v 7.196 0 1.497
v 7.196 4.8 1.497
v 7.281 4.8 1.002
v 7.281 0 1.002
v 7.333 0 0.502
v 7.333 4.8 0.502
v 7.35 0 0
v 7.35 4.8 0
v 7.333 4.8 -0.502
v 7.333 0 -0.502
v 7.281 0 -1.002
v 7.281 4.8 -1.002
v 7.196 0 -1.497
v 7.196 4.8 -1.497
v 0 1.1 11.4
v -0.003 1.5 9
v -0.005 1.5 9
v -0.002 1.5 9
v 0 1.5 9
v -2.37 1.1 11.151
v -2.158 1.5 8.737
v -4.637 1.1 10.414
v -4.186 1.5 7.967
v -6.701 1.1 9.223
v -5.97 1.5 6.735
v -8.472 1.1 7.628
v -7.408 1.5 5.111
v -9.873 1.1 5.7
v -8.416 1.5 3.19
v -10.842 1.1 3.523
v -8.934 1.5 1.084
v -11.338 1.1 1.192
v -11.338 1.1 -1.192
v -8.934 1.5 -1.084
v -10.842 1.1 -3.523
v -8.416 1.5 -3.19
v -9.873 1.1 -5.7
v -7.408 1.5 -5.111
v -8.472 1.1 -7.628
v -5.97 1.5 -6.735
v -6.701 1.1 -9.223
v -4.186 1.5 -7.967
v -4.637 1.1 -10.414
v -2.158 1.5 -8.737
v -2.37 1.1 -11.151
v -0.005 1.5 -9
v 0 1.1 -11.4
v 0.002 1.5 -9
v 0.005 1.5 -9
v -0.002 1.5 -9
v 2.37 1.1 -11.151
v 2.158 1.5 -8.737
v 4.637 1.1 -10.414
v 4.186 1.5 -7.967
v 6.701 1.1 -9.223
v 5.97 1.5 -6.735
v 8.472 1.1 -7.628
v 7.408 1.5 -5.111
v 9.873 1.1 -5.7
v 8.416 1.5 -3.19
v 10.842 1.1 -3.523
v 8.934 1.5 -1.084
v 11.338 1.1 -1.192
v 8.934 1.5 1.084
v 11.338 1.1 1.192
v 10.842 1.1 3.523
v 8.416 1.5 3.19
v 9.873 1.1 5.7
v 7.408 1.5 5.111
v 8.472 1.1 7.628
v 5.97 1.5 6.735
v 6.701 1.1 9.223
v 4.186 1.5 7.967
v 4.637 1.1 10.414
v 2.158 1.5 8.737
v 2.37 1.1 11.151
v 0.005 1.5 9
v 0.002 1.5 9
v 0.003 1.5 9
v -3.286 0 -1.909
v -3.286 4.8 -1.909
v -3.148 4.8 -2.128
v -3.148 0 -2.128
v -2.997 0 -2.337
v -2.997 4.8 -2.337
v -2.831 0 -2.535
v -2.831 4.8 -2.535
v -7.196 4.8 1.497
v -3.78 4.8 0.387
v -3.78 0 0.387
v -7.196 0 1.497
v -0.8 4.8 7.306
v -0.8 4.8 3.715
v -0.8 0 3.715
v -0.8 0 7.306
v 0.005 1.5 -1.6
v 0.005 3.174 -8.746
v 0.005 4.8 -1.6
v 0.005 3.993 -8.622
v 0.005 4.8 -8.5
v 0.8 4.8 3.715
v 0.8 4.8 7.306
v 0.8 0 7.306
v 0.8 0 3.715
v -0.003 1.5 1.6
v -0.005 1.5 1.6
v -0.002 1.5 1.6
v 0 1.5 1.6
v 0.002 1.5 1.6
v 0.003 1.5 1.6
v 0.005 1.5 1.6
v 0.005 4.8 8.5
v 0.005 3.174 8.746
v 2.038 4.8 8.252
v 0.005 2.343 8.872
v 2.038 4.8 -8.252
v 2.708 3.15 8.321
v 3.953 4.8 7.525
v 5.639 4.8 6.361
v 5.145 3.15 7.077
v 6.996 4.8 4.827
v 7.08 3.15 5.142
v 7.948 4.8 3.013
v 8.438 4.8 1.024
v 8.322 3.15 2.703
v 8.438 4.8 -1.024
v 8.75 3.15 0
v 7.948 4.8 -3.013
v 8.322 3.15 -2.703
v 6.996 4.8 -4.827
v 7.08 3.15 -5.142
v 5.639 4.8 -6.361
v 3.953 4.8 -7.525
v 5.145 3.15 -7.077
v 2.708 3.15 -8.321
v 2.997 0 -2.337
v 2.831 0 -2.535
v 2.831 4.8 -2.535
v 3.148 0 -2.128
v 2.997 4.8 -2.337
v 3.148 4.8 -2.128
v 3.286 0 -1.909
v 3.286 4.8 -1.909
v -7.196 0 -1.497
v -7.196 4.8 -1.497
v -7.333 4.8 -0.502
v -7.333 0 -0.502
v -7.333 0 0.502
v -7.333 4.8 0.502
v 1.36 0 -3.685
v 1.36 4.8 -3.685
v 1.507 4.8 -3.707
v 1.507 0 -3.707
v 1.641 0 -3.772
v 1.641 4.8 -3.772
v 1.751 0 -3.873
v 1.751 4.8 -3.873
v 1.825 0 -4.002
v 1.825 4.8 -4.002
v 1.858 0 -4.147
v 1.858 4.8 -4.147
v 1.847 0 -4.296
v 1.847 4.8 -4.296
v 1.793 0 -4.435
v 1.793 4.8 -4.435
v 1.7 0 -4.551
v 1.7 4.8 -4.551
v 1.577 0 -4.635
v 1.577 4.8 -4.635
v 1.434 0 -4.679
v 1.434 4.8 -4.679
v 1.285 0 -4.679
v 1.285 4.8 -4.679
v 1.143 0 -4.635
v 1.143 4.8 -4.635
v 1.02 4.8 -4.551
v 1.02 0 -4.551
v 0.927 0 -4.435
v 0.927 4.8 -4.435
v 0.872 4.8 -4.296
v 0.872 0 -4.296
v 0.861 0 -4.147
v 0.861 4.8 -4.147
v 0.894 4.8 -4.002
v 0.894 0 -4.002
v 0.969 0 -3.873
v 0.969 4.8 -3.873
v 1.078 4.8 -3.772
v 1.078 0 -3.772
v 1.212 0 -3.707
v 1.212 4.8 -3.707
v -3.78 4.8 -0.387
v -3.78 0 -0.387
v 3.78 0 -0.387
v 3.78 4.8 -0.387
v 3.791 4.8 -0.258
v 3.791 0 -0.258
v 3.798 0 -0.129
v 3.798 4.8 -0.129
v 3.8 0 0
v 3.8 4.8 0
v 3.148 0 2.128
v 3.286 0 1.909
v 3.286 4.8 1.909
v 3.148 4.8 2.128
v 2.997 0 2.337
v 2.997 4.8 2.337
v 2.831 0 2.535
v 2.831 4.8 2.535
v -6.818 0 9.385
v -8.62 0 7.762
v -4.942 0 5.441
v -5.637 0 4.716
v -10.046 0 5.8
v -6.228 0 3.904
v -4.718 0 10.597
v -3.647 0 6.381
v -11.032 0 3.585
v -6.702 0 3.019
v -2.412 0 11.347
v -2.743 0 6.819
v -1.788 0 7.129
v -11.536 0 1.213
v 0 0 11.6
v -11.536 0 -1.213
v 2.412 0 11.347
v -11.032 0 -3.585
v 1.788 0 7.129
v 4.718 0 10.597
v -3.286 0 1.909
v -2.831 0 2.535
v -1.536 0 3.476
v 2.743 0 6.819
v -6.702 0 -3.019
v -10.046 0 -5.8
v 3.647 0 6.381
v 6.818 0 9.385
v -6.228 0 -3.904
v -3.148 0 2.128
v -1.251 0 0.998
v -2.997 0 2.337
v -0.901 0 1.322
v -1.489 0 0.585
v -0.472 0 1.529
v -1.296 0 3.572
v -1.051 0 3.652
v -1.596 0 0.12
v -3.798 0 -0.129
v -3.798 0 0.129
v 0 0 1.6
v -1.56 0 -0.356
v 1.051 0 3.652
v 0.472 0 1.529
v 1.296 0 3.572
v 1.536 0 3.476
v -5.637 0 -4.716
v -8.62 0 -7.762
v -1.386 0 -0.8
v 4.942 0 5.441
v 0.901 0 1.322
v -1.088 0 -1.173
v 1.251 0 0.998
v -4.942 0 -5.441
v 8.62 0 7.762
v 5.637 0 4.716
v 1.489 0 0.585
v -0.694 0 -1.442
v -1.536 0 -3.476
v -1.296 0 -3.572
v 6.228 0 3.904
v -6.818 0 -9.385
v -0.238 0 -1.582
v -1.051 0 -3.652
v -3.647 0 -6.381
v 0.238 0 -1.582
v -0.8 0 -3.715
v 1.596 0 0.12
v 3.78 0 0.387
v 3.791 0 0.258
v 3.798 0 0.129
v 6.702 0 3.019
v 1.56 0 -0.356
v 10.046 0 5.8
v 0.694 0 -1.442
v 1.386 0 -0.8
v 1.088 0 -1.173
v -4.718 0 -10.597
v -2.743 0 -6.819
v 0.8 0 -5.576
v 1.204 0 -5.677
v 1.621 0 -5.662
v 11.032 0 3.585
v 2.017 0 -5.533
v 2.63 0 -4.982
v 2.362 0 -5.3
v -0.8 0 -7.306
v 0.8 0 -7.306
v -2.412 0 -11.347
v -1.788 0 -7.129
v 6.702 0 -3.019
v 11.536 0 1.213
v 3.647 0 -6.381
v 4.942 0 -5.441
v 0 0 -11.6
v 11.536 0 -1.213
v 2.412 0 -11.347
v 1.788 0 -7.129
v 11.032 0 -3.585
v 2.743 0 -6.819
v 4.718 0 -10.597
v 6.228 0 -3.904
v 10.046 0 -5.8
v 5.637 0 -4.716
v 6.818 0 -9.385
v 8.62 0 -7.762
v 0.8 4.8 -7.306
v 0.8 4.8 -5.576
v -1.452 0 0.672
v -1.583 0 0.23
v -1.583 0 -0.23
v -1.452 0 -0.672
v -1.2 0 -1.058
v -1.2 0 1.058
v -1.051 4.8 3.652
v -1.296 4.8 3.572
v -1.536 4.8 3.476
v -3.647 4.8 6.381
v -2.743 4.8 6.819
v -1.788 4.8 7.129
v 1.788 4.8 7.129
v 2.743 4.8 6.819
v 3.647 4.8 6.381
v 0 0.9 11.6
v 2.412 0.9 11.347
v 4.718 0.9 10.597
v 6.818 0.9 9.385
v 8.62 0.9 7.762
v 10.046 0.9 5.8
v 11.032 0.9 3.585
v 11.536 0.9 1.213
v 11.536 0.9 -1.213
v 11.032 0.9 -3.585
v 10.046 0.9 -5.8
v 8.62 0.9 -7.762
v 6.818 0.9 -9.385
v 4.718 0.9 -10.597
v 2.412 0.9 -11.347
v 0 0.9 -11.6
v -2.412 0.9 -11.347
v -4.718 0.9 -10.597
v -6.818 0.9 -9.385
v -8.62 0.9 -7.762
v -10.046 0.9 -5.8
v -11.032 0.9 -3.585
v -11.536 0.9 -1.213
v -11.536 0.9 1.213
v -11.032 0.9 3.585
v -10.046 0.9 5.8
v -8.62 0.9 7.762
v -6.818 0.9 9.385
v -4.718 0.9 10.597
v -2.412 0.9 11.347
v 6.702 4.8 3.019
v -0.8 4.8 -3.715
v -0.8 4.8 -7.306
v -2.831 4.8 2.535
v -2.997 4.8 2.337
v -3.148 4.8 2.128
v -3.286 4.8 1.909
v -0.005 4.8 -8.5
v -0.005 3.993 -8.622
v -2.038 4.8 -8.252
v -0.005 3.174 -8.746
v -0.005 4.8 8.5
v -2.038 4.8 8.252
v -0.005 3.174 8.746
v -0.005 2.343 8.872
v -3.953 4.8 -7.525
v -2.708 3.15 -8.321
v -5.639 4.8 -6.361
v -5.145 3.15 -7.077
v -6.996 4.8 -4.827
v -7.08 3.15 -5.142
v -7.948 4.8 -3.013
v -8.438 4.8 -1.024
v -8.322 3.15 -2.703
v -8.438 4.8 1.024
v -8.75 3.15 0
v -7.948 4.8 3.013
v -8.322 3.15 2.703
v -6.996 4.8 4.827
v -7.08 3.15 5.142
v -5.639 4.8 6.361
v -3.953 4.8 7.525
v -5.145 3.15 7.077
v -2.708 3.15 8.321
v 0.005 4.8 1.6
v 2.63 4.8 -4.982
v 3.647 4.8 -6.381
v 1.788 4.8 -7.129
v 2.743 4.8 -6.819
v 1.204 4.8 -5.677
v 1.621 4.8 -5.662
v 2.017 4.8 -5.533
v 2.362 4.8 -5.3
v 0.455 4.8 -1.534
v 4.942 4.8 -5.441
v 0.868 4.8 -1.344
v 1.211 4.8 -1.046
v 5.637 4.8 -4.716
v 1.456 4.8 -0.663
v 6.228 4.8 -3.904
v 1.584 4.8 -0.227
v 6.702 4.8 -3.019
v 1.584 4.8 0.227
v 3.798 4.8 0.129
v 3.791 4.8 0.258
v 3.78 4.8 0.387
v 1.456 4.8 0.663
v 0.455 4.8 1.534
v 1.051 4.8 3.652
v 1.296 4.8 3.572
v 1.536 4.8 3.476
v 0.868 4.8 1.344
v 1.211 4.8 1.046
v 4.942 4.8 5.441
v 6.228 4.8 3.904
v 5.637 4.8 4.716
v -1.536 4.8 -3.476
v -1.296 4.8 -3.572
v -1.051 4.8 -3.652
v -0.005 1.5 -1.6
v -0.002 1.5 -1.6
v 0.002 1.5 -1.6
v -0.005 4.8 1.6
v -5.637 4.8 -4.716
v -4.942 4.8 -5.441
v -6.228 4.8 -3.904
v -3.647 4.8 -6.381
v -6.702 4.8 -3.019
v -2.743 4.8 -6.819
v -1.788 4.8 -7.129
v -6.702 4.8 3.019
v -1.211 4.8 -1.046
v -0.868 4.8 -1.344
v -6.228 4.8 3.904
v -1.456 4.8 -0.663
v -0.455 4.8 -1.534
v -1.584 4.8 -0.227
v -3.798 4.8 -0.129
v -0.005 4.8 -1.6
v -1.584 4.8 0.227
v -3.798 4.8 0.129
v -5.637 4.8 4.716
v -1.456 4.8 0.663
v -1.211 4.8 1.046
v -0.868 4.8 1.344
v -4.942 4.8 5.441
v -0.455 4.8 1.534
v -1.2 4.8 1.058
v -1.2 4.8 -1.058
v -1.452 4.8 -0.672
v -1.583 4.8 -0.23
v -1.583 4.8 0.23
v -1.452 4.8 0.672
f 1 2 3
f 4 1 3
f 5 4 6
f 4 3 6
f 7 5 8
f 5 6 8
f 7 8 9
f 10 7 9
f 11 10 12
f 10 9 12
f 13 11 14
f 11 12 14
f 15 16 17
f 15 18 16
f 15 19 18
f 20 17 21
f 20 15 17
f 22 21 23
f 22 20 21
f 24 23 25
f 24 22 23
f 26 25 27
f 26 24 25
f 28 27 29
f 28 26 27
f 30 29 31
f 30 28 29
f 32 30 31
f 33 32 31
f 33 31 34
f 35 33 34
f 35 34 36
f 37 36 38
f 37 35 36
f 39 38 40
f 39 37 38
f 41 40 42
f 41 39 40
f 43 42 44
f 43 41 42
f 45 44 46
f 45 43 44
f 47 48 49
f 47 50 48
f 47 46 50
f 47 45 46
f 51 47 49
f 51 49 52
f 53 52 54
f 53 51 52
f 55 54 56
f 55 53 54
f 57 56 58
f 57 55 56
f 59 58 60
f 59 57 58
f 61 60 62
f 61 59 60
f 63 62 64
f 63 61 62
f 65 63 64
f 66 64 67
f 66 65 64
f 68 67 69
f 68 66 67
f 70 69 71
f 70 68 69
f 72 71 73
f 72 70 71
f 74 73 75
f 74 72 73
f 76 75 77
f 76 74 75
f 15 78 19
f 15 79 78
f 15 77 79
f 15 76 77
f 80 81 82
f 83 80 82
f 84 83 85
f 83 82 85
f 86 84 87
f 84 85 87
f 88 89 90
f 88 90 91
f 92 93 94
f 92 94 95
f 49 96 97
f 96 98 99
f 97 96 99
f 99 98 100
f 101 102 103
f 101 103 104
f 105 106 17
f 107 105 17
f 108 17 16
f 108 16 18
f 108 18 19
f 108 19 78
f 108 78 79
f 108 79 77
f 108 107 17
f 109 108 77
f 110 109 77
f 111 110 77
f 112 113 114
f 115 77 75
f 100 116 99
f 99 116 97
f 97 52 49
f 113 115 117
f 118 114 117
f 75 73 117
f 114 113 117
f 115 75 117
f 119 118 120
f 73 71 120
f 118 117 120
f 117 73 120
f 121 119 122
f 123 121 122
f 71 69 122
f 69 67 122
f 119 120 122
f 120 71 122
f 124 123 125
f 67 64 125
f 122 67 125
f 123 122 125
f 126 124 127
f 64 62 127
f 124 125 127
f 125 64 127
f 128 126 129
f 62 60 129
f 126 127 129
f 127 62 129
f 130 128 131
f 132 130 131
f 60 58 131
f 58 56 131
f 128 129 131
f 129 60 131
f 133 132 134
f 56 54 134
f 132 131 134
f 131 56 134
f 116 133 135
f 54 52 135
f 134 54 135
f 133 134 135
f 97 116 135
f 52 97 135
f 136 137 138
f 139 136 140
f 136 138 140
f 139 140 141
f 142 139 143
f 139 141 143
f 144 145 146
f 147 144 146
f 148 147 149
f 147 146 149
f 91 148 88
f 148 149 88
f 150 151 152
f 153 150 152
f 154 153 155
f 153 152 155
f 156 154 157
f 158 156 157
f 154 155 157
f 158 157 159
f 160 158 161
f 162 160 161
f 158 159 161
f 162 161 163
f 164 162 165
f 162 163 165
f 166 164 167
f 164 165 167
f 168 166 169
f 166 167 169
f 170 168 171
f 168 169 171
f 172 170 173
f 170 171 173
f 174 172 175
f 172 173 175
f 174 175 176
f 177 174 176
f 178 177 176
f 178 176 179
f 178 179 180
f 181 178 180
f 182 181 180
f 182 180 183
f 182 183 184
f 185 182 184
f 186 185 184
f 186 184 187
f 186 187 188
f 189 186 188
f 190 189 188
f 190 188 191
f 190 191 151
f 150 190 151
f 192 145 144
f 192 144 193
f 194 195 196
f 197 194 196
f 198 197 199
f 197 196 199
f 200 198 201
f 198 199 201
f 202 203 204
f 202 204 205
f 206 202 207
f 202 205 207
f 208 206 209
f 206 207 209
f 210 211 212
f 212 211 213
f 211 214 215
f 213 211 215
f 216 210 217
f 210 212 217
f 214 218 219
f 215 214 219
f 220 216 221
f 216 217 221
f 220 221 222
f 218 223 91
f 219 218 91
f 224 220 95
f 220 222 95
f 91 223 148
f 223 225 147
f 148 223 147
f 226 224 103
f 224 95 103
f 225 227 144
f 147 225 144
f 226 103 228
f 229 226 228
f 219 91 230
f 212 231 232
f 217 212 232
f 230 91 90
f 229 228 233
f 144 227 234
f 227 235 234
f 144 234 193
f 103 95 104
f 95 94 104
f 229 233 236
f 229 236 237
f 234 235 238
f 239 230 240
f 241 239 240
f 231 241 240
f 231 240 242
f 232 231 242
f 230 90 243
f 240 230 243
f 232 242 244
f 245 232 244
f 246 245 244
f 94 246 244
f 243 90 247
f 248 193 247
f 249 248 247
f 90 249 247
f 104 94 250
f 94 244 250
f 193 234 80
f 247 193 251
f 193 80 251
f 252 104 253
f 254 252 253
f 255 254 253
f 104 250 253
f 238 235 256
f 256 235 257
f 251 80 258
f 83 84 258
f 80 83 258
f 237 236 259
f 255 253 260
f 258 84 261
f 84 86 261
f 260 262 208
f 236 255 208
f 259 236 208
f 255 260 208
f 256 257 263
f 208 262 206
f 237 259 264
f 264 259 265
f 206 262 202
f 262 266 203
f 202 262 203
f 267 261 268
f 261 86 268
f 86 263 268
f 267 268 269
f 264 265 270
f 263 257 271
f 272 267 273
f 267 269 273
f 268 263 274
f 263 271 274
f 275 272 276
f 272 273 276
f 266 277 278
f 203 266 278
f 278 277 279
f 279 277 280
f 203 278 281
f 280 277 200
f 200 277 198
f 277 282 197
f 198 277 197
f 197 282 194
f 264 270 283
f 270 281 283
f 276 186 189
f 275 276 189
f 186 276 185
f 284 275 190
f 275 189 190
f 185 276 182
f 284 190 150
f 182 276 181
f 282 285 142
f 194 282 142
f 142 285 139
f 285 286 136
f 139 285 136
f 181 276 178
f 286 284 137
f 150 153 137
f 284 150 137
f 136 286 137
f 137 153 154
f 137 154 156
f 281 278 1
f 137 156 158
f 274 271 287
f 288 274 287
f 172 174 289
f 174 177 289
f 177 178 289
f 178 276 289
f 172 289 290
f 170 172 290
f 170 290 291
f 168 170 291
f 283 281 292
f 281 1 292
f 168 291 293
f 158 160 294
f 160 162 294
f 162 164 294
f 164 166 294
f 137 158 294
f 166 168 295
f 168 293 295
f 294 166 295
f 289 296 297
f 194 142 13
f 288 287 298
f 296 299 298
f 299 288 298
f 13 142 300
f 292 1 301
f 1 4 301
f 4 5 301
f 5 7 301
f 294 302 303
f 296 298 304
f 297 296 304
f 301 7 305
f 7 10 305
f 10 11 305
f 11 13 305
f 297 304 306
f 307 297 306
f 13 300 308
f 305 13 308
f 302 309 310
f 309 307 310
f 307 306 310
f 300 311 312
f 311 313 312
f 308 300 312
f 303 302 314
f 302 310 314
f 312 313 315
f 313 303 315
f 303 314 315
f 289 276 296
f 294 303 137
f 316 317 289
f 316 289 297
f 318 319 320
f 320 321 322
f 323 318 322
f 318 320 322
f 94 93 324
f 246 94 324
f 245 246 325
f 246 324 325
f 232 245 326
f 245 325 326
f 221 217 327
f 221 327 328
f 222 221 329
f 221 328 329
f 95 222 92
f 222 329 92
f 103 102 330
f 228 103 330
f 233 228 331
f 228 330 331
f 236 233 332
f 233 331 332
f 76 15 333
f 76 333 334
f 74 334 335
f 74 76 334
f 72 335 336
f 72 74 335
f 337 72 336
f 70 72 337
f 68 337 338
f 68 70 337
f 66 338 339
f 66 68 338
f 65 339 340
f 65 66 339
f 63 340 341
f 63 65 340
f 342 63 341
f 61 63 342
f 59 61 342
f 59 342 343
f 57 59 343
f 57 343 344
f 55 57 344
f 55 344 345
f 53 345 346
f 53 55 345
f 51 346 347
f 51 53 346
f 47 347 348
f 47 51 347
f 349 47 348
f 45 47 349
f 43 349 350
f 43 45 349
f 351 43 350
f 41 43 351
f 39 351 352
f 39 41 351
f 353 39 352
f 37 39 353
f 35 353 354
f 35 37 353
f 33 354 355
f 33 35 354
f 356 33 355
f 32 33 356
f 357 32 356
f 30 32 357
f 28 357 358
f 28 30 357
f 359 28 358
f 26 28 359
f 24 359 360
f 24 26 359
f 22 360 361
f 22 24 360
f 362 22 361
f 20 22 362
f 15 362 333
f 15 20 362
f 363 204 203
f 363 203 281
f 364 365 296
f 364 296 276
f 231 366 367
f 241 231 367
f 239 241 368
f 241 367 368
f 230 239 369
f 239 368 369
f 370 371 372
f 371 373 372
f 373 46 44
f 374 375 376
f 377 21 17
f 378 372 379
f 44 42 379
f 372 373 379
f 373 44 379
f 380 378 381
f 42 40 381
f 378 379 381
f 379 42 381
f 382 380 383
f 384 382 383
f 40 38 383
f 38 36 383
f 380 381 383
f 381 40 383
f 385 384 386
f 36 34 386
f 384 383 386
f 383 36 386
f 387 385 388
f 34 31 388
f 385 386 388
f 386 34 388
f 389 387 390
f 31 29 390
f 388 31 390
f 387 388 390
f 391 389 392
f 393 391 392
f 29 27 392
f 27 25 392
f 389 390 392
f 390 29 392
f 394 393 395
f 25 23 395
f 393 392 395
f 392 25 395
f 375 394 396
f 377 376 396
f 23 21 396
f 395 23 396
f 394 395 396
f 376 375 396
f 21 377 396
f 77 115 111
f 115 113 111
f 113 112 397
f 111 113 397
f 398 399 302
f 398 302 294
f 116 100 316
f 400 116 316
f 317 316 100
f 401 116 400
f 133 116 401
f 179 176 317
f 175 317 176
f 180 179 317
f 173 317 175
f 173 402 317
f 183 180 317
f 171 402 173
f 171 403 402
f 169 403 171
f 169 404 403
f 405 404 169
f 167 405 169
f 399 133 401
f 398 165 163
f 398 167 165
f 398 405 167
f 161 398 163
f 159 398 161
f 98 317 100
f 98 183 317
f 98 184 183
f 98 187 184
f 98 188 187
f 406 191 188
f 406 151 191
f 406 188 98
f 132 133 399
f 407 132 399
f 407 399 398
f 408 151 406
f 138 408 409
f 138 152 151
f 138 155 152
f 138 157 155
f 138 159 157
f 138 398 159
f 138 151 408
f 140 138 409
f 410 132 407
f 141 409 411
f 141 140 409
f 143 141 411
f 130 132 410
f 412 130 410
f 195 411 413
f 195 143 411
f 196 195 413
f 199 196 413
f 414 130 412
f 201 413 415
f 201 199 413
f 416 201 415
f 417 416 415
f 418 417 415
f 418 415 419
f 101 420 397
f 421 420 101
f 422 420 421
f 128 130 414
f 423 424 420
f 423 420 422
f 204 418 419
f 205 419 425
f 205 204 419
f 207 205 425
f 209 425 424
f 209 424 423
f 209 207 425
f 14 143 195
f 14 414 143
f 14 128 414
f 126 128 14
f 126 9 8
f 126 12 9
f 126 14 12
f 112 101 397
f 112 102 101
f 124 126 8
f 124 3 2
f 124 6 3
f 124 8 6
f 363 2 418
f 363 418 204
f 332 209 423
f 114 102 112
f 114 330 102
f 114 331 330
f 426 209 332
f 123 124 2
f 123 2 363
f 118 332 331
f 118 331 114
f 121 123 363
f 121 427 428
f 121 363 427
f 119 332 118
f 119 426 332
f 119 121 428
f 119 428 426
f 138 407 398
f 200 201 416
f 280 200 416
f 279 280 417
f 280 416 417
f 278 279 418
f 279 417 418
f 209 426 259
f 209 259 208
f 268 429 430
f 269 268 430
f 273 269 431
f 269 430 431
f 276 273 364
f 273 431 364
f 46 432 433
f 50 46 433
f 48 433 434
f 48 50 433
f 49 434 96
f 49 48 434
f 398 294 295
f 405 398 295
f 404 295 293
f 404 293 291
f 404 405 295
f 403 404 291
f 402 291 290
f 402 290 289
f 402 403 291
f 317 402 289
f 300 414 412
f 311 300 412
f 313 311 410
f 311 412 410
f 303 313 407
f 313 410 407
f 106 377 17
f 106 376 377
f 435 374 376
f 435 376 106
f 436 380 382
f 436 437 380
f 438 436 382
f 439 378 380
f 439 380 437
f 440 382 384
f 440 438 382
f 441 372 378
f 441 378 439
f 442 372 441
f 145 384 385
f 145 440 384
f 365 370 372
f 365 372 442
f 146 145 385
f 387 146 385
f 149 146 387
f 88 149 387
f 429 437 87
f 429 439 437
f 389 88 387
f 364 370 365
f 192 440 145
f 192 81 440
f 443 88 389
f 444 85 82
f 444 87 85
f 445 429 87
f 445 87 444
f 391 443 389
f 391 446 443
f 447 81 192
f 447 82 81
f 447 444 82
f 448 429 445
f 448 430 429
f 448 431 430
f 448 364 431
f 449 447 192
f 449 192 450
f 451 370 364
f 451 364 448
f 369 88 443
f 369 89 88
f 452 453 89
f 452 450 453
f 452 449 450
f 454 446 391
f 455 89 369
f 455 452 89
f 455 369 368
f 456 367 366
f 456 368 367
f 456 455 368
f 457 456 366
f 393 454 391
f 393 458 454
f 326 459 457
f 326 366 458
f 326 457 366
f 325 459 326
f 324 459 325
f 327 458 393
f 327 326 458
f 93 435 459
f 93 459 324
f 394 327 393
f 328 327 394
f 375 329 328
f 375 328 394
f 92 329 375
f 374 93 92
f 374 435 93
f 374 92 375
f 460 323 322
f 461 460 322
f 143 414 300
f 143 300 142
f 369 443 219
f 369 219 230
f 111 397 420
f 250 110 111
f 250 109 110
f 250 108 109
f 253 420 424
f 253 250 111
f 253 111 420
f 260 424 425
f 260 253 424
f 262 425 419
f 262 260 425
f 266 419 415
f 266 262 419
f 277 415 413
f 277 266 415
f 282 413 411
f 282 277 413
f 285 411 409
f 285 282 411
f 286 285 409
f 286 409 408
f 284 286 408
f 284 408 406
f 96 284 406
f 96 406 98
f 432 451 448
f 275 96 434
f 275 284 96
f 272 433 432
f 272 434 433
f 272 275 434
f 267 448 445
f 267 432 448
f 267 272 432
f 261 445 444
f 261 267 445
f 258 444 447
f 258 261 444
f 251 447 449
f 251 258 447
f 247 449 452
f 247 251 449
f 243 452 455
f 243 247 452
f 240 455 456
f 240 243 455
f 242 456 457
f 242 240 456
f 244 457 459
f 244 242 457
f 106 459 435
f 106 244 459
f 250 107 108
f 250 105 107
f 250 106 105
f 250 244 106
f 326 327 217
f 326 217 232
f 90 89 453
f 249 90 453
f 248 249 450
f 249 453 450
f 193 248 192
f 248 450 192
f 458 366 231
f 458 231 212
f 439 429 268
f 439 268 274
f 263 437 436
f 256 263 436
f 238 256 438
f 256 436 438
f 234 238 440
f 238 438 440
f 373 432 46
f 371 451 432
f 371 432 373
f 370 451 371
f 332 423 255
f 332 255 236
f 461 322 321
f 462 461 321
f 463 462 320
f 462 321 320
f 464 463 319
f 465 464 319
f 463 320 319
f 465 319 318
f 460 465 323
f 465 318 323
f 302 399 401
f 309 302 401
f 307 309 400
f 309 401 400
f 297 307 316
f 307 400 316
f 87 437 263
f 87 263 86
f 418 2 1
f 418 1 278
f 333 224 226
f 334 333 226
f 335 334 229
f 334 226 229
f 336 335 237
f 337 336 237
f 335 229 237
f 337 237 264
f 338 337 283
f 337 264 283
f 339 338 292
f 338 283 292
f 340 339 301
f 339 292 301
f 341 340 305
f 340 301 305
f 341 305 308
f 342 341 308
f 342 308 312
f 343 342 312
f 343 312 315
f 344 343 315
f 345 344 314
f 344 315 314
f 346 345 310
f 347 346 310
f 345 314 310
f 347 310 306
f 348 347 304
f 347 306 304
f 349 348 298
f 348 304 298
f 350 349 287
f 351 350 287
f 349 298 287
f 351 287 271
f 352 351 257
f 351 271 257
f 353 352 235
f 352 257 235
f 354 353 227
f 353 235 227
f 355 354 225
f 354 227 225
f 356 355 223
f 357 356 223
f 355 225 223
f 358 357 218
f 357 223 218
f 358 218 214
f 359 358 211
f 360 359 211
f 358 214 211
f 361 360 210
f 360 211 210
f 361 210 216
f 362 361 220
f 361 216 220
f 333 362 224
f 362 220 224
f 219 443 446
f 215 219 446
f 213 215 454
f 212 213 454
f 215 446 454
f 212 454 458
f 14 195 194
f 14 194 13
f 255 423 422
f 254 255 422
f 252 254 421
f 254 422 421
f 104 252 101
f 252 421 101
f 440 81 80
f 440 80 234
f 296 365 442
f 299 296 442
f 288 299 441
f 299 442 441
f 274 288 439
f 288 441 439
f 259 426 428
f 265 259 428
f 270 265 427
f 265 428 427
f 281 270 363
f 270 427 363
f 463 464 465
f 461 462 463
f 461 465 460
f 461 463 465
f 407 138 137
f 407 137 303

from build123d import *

# Parameters (mm, degrees)
SKETCH_4_R               = 11.6
SKETCH_4_R_2             = 1.6
EXTRUDE_1_DEPTH          = 1.1
EXTRUDE_START            = 1.5
SKETCH_4_3_R             = 9
SKETCH_4_3_R_2           = 1.6
EXTRUDE_2_DEPTH          = 3.3
CHAMFER_1_SIZE           = 0.2
SKETCH_4_4_R             = 1.6
CUT_EXTRUDE_2_DEPTH      = 18.092688495
CHAMFER_2_SIZE           = 0.5
CHAMFER_2_SIZE_2         = 3.3
CUT_EXTRUDE_4_DEPTH      = 18.092688495
EXTRUDE_3_DEPTH          = 4.8
PATTERN_CIRCULAR_2_COUNT = 10
SKETCH_6_R               = 1.5
EXTRUDE_4_DEPTH          = 4.8
SKETCH_6_3_R             = 0.5
CUT_EXTRUDE_5_DEPTH      = 18.092688495
EXTRUDE_5_DEPTH          = 4.8
SKETCH_7_W               = 0.01
SKETCH_7_H               = 22.799997808
CUT_EXTRUDE_6_DEPTH      = 3.3


with BuildPart() as part:
    # 草图4 → 凸台-拉伸1 (new body)
    with BuildSketch(Plane(origin=(0, 0, 0), x_dir=(1, 0, 0), z_dir=(0, 1, 0))):
        with Locations(Location((0, 0, 0), (0, 0, 270))):
            Circle(SKETCH_4_R)
        with Locations(Location((0, 0, 0), (0, 0, 270))):
            Circle(SKETCH_4_R_2, mode=Mode.SUBTRACT)
    extrude(amount=EXTRUDE_1_DEPTH)

    # 倒角1
    chamfer_1_edges = [part.edges().sort_by_distance(p)[0] for p in [
        (0, 1.1, -11.6),
    ]]
    chamfer(chamfer_1_edges, length=CHAMFER_1_SIZE)


with BuildPart() as body_2:
    # 草图4<3> → 凸台-拉伸2 (new body)
    with BuildSketch(Plane(origin=(0, 0, 0), x_dir=(1, 0, 0), z_dir=(0, 1, 0)).offset(EXTRUDE_START)):
        with Locations(Location((0, 0, 0), (0, 0, 270))):
            Circle(SKETCH_4_3_R)
        with Locations(Location((0, 0, 0), (0, 0, 270))):
            Circle(SKETCH_4_3_R_2, mode=Mode.SUBTRACT)
    extrude(amount=EXTRUDE_2_DEPTH)


    add(part.part)  # loft_1 joins it to this body
    # loft up to a face of the part (loft_1)
    loft([Face(Wire([body_2.edges().sort_by_distance((-6.560717647, 1.5, -6.160923953))[0]])), Face(Wire([body_2.edges().sort_by_distance((8.310242353, 1.1, -7.803837008))[0]]))])

    # 草图4<4> → 切除-拉伸2 (cut, through all)
    with BuildSketch(Plane(origin=(0, 0, 0), x_dir=(1, 0, 0), z_dir=(0, 1, 0))):
        with Locations(Location((0, 0, 0), (0, 0, 270))):
            Circle(SKETCH_4_4_R)
    extrude(amount=CUT_EXTRUDE_2_DEPTH, mode=Mode.SUBTRACT)

    # 倒角2
    # the kernel refuses this chamfer: 3.3, 0.5 mm, written as the material it takes off along each edge
    with BuildSketch(Plane(origin=(0, 4.8, 0), x_dir=(0, 0, 1), z_dir=(-1, 0, 0))) as chamfer_2_piece_1:
        Polygon((9 - CHAMFER_2_SIZE, 0), (9, -CHAMFER_2_SIZE_2), (9, 0), align=None)
    revolve(axis=Axis((0, 4.8, 0), (0, 1, 0)), mode=Mode.SUBTRACT)

    # 草图5 → 切除-拉伸4 (cut, through all)
    with BuildSketch(Plane(origin=(0, 4.8, 0), x_dir=(1, 0, 0), z_dir=(0, 1, 0))):
        with BuildLine():
            ThreePointArc((3.8, 0), (-2.387467277, -2.9563491), (-0.8, 3.714835124))
            Line((-0.8, 3.714835124), (-0.8, 7.30633287))
            ThreePointArc((-0.8, 7.30633287), (-4.906246019, -5.47277352), (7.35, 0))
            ThreePointArc((7.35, 0), (5.47277352, 4.906246019), (0.8, 7.30633287))
            Line((0.8, 7.30633287), (0.8, 3.714835124))
            ThreePointArc((0.8, 3.714835124), (2.9563491, 2.387467277), (3.8, 0))
        make_face()
        with BuildLine():
            Line((-0.8, 7.30633287), (-0.8, 3.714835124))
            ThreePointArc((-0.8, 3.714835124), (-0.402260194, 3.778648798), (0, 3.8))
            Line((0, 3.8), (0, 7.35))
            ThreePointArc((0, 7.35), (-0.400595438, 7.339075098), (-0.8, 7.30633287))
        make_face()
        with BuildLine():
            Line((0, 7.35), (0, 3.8))
            ThreePointArc((0, 3.8), (0.402260194, 3.778648798), (0.8, 3.714835124))
            Line((0.8, 3.714835124), (0.8, 7.30633287))
            ThreePointArc((0.8, 7.30633287), (0.400595438, 7.339075098), (0, 7.35))
        make_face()
    extrude(amount=-CUT_EXTRUDE_4_DEPTH, mode=Mode.SUBTRACT)


with BuildPart() as cut_extrude_4_piece_1:
    # of the separate pieces the step leaves, piece 1, a body of its own (cut_extrude_4_pieces)
    add(body_2.part.solids().sort_by_distance((0, 0.9, 11.6))[0])

    # 草图5<4> → 凸台-拉伸3 (add)
    with BuildSketch(Plane(origin=(0, 4.8, 0), x_dir=(1, 0, 0), z_dir=(0, 1, 0))):
        with BuildLine():
            Line((0, 7.35), (0, 3.8))
            ThreePointArc((0, 3.8), (0.402260194, 3.778648798), (0.8, 3.714835124))
            Line((0.8, 3.714835124), (0.8, 7.30633287))
            ThreePointArc((0.8, 7.30633287), (0.400595438, 7.339075098), (0, 7.35))
        make_face()
        with BuildLine():
            Line((-0.8, 7.30633287), (-0.8, 3.714835124))
            ThreePointArc((-0.8, 3.714835124), (-0.402260194, 3.778648798), (0, 3.8))
            Line((0, 3.8), (0, 7.35))
            ThreePointArc((0, 7.35), (-0.400595438, 7.339075098), (-0.8, 7.30633287))
        make_face()
    extrude_3 = extrude(amount=-EXTRUDE_3_DEPTH)

    # 阵列(圆周)2: 凸台-拉伸3 ×10 about axis
    pattern_circular_2_axis = Axis((0, 0, 0), (0, 1, 0))
    for i in range(1, PATTERN_CIRCULAR_2_COUNT):
        add(extrude_3.rotate(pattern_circular_2_axis, i * 360 / PATTERN_CIRCULAR_2_COUNT))



with BuildPart() as cut_extrude_4_piece_2:
    # of the separate pieces the step leaves, piece 2, a body of its own (cut_extrude_4_pieces)
    add(body_2.part.solids().sort_by_distance((-0.8, 0, -3.714835124))[0])


with BuildPart() as cut_extrude_4_piece_1_1:
    add(cut_extrude_4_piece_1.part)

    add(cut_extrude_4_piece_2.part)  # 凸台-拉伸4 merges 切除-拉伸4 piece 2
    # 草图6 → 凸台-拉伸4 (add, through all)
    with BuildSketch(Plane(origin=(0, 4.8, 0), x_dir=(1, 0, 0), z_dir=(0, 1, 0))):
        with Locations((1.359674775, 4.184648672)):
            Circle(SKETCH_6_R)
    extrude(amount=-EXTRUDE_4_DEPTH)

    # 草图6<3> → 切除-拉伸5 (cut, through all)
    with BuildSketch(Plane(origin=(0, 4.8, 0), x_dir=(1, 0, 0), z_dir=(0, 1, 0))):
        with Locations(Location((1.359674775, 4.184648672, 0), (0, 0, 270))):
            Circle(SKETCH_6_3_R)
    extrude(amount=-CUT_EXTRUDE_5_DEPTH, mode=Mode.SUBTRACT)

    # 草图7 → 切除-拉伸6 (cut)
    with BuildSketch(Plane(origin=(0, 4.8, 0), x_dir=(1, 0, 0), z_dir=(0, 1, 0))):
        Rectangle(SKETCH_7_W, SKETCH_7_H)
    extrude(amount=-CUT_EXTRUDE_6_DEPTH, mode=Mode.SUBTRACT)


with BuildPart() as body_2_2:
    # 草图4<6> → 凸台-拉伸5 (new body)
    with BuildSketch(Plane(origin=(0, 0, 0), x_dir=(1, 0, 0), z_dir=(0, 1, 0))):
        with BuildLine():
            Line((-1.2, -1.058300524), (-1.2, 1.058300524))
            ThreePointArc((-1.2, 1.058300524), (-1.6, 0), (-1.2, -1.058300524))
        make_face()
    extrude(amount=EXTRUDE_5_DEPTH)


solid = Compound([cut_extrude_4_piece_1_1.part, body_2_2.part])
